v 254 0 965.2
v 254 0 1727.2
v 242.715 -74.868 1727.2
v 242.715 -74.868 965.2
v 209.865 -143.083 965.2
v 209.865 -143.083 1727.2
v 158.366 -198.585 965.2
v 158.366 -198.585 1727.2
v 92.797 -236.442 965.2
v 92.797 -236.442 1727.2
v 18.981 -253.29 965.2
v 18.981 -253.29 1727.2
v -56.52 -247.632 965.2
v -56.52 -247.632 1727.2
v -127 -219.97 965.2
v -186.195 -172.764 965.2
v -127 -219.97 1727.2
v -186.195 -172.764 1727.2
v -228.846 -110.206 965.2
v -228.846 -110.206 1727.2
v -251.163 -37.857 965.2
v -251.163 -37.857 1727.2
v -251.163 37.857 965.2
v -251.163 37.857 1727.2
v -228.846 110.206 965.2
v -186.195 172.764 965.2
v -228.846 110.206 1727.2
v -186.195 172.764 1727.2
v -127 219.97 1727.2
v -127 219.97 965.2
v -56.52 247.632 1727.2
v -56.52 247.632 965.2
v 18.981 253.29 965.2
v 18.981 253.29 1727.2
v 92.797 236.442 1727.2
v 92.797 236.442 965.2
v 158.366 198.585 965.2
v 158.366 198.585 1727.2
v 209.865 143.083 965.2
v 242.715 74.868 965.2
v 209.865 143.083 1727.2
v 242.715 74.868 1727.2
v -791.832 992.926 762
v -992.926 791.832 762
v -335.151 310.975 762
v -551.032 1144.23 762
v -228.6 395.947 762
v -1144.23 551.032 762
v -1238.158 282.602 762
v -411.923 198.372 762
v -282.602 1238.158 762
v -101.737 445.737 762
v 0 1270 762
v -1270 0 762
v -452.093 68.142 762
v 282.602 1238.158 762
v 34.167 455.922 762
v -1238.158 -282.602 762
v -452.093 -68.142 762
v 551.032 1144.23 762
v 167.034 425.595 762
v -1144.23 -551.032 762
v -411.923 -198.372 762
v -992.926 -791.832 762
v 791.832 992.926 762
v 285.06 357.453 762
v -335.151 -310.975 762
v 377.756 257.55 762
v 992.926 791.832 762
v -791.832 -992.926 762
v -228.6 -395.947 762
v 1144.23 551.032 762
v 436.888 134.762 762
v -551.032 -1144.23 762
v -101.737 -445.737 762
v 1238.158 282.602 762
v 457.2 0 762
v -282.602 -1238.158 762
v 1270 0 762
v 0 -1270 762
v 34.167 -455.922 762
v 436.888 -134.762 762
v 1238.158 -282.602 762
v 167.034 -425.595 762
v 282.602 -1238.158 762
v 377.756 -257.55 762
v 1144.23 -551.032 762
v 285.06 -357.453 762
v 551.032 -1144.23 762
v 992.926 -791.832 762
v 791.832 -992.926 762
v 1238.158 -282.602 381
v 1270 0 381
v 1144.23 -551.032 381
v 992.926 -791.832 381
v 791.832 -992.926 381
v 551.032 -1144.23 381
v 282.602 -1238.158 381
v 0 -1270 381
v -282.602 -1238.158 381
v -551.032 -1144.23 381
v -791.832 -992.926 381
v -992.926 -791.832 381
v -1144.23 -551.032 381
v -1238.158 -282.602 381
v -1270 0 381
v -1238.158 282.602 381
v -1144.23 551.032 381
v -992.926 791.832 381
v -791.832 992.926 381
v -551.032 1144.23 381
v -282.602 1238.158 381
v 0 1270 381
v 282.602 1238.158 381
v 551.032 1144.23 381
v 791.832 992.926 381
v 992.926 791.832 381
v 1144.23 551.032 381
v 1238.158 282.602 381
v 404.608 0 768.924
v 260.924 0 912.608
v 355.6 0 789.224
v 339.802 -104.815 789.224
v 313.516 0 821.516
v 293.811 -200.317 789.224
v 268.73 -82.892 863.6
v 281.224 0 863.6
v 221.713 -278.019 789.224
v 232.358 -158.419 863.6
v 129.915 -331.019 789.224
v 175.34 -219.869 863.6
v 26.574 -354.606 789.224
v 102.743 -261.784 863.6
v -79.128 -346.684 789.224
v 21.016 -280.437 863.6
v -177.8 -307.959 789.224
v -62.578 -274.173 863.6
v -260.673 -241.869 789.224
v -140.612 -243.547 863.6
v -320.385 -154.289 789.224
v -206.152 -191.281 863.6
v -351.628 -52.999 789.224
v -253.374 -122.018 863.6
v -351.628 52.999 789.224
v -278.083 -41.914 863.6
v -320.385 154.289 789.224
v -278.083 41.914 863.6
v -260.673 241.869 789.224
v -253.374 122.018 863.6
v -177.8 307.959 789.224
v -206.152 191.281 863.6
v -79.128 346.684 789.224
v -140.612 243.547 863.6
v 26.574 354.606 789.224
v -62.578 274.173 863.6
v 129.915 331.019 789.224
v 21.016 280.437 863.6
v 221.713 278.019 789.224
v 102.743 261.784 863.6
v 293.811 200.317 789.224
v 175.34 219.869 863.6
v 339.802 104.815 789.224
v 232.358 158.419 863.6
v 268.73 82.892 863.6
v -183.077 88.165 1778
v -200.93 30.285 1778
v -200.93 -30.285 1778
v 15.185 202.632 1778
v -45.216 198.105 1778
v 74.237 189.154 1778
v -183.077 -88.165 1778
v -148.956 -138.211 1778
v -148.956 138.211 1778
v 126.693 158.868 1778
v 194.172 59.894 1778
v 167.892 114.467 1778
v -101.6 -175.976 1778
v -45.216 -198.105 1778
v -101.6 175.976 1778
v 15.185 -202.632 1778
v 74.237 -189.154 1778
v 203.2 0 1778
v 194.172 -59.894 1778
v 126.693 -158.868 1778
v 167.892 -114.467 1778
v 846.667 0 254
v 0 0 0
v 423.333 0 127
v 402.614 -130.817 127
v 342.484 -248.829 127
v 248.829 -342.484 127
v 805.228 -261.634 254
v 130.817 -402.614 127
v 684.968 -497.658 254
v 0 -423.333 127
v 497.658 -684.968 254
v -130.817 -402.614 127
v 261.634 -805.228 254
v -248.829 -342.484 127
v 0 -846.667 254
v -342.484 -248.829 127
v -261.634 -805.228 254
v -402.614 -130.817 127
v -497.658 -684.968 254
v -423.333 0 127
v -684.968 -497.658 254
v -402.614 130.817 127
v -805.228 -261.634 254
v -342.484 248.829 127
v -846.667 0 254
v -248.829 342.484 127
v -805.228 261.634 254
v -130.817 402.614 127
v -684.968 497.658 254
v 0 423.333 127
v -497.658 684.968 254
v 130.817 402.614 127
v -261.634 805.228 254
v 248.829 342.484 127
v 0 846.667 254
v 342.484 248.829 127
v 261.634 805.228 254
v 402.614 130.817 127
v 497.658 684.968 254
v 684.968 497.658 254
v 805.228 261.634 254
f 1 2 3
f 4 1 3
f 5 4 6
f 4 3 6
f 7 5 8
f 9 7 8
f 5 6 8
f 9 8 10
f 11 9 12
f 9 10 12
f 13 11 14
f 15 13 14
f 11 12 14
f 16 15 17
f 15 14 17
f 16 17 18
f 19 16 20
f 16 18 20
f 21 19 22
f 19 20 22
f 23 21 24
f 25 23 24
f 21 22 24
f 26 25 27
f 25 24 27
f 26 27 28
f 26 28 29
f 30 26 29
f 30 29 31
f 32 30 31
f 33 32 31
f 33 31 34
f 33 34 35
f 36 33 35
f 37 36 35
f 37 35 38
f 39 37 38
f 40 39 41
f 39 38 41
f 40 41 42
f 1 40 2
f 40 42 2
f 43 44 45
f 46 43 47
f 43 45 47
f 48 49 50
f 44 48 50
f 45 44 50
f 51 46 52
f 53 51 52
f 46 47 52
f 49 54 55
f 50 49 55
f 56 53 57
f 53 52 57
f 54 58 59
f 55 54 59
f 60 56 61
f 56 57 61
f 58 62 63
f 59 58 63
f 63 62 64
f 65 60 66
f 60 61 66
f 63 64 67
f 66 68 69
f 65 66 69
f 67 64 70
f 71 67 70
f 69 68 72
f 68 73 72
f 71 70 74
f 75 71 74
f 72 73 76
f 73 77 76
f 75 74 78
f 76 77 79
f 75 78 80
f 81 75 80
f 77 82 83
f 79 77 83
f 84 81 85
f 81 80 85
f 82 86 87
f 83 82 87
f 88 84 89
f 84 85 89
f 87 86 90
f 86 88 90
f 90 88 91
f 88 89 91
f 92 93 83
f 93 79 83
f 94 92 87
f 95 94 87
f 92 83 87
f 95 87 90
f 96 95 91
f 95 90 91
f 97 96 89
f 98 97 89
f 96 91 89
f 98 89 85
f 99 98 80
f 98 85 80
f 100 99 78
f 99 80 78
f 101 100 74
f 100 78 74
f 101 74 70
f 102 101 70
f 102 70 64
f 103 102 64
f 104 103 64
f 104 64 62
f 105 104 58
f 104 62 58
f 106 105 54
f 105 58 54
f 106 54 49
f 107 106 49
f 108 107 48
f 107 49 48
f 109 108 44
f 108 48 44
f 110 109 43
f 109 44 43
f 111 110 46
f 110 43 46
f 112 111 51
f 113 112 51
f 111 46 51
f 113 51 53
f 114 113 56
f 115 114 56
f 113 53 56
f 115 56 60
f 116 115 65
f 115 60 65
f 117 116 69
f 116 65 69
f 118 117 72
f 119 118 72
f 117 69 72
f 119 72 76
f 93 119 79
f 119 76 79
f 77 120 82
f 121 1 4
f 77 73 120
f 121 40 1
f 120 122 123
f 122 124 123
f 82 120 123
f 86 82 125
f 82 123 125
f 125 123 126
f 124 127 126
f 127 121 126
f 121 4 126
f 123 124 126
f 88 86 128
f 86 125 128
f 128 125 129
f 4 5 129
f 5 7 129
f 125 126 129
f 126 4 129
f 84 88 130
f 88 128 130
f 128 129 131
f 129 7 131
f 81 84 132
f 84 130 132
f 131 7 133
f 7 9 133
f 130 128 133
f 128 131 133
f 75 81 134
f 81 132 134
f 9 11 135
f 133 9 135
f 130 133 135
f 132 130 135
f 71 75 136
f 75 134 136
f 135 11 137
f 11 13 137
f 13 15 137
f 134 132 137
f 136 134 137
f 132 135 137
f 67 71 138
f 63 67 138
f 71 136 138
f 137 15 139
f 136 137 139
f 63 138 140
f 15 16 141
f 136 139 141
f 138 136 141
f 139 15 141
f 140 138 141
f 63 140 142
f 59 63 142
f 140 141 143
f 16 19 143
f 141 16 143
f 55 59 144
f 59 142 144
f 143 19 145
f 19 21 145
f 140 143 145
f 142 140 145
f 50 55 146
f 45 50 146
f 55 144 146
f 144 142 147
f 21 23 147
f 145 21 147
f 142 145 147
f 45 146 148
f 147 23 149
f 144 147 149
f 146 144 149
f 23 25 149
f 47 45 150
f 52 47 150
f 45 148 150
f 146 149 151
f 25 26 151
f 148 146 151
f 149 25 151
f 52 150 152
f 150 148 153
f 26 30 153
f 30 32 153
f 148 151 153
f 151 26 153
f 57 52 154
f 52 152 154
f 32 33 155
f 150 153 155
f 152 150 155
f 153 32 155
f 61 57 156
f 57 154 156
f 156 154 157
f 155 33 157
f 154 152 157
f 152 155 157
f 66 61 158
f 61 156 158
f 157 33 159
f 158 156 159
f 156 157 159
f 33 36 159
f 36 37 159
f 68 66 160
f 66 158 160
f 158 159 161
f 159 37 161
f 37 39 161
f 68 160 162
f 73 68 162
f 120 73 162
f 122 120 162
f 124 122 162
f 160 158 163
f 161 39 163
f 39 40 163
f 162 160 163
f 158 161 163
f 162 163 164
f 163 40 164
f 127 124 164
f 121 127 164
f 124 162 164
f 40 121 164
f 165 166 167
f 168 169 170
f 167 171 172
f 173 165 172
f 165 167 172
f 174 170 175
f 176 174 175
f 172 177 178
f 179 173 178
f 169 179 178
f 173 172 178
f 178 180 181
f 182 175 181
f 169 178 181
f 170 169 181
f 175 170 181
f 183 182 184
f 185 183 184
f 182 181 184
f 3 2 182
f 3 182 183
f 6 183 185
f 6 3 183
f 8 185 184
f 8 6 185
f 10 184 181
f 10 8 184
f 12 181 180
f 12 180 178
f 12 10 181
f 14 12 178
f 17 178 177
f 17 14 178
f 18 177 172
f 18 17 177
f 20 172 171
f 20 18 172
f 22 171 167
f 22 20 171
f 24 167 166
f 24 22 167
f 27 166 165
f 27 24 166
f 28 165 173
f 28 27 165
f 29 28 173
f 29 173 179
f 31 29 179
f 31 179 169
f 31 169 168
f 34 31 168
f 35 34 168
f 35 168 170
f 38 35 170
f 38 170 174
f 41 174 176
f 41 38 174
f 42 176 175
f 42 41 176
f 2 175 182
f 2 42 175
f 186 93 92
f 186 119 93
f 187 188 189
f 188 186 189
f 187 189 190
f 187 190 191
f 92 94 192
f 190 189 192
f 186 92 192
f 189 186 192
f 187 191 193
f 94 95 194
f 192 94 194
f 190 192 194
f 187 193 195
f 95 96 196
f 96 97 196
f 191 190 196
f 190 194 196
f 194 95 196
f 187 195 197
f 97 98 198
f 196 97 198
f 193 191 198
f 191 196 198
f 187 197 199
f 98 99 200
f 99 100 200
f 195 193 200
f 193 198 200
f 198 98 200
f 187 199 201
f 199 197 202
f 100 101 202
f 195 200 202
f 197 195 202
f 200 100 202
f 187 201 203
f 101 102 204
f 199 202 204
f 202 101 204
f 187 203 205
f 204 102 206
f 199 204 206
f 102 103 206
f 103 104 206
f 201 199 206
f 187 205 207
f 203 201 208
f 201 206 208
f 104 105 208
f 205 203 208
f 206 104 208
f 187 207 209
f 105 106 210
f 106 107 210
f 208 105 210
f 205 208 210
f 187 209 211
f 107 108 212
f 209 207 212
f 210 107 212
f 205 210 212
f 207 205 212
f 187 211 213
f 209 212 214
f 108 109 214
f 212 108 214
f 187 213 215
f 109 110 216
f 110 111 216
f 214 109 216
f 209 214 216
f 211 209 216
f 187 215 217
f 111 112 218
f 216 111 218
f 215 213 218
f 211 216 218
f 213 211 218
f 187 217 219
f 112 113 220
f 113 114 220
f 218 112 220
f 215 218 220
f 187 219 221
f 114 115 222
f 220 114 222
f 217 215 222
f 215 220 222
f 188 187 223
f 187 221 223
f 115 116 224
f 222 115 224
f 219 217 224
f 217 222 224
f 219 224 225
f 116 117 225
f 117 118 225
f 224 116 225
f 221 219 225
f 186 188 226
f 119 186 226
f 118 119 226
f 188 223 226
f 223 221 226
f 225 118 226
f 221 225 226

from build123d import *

# Parameters (mm, degrees)
F2_SIZE = 50.8


with BuildPart() as f1:
    # F0 (on Front) → F1 (revolve)
    with BuildSketch(Plane.XZ):
        with BuildLine():
            Line((254, 1778), (0, 1778))
            Line((0, 1778), (0, 0))
            Line((0, 0), (1270, 381))
            Line((1270, 381), (1270, 762))
            Line((1270, 762), (457.2, 762))
            ThreePointArc((457.2, 762), (313.515902, 821.515902), (254, 965.2))
            Line((254, 965.2), (254, 1778))
        make_face()
    revolve(axis=Axis((0, 0, 170.350316), (0, 0, -1)))

    # F2
    f2_edges = [f1.edges().sort_by_distance(p)[0] for p in [
        (-254, 0, 1778),
    ]]
    chamfer(f2_edges, length=F2_SIZE)


solid = f1.part
